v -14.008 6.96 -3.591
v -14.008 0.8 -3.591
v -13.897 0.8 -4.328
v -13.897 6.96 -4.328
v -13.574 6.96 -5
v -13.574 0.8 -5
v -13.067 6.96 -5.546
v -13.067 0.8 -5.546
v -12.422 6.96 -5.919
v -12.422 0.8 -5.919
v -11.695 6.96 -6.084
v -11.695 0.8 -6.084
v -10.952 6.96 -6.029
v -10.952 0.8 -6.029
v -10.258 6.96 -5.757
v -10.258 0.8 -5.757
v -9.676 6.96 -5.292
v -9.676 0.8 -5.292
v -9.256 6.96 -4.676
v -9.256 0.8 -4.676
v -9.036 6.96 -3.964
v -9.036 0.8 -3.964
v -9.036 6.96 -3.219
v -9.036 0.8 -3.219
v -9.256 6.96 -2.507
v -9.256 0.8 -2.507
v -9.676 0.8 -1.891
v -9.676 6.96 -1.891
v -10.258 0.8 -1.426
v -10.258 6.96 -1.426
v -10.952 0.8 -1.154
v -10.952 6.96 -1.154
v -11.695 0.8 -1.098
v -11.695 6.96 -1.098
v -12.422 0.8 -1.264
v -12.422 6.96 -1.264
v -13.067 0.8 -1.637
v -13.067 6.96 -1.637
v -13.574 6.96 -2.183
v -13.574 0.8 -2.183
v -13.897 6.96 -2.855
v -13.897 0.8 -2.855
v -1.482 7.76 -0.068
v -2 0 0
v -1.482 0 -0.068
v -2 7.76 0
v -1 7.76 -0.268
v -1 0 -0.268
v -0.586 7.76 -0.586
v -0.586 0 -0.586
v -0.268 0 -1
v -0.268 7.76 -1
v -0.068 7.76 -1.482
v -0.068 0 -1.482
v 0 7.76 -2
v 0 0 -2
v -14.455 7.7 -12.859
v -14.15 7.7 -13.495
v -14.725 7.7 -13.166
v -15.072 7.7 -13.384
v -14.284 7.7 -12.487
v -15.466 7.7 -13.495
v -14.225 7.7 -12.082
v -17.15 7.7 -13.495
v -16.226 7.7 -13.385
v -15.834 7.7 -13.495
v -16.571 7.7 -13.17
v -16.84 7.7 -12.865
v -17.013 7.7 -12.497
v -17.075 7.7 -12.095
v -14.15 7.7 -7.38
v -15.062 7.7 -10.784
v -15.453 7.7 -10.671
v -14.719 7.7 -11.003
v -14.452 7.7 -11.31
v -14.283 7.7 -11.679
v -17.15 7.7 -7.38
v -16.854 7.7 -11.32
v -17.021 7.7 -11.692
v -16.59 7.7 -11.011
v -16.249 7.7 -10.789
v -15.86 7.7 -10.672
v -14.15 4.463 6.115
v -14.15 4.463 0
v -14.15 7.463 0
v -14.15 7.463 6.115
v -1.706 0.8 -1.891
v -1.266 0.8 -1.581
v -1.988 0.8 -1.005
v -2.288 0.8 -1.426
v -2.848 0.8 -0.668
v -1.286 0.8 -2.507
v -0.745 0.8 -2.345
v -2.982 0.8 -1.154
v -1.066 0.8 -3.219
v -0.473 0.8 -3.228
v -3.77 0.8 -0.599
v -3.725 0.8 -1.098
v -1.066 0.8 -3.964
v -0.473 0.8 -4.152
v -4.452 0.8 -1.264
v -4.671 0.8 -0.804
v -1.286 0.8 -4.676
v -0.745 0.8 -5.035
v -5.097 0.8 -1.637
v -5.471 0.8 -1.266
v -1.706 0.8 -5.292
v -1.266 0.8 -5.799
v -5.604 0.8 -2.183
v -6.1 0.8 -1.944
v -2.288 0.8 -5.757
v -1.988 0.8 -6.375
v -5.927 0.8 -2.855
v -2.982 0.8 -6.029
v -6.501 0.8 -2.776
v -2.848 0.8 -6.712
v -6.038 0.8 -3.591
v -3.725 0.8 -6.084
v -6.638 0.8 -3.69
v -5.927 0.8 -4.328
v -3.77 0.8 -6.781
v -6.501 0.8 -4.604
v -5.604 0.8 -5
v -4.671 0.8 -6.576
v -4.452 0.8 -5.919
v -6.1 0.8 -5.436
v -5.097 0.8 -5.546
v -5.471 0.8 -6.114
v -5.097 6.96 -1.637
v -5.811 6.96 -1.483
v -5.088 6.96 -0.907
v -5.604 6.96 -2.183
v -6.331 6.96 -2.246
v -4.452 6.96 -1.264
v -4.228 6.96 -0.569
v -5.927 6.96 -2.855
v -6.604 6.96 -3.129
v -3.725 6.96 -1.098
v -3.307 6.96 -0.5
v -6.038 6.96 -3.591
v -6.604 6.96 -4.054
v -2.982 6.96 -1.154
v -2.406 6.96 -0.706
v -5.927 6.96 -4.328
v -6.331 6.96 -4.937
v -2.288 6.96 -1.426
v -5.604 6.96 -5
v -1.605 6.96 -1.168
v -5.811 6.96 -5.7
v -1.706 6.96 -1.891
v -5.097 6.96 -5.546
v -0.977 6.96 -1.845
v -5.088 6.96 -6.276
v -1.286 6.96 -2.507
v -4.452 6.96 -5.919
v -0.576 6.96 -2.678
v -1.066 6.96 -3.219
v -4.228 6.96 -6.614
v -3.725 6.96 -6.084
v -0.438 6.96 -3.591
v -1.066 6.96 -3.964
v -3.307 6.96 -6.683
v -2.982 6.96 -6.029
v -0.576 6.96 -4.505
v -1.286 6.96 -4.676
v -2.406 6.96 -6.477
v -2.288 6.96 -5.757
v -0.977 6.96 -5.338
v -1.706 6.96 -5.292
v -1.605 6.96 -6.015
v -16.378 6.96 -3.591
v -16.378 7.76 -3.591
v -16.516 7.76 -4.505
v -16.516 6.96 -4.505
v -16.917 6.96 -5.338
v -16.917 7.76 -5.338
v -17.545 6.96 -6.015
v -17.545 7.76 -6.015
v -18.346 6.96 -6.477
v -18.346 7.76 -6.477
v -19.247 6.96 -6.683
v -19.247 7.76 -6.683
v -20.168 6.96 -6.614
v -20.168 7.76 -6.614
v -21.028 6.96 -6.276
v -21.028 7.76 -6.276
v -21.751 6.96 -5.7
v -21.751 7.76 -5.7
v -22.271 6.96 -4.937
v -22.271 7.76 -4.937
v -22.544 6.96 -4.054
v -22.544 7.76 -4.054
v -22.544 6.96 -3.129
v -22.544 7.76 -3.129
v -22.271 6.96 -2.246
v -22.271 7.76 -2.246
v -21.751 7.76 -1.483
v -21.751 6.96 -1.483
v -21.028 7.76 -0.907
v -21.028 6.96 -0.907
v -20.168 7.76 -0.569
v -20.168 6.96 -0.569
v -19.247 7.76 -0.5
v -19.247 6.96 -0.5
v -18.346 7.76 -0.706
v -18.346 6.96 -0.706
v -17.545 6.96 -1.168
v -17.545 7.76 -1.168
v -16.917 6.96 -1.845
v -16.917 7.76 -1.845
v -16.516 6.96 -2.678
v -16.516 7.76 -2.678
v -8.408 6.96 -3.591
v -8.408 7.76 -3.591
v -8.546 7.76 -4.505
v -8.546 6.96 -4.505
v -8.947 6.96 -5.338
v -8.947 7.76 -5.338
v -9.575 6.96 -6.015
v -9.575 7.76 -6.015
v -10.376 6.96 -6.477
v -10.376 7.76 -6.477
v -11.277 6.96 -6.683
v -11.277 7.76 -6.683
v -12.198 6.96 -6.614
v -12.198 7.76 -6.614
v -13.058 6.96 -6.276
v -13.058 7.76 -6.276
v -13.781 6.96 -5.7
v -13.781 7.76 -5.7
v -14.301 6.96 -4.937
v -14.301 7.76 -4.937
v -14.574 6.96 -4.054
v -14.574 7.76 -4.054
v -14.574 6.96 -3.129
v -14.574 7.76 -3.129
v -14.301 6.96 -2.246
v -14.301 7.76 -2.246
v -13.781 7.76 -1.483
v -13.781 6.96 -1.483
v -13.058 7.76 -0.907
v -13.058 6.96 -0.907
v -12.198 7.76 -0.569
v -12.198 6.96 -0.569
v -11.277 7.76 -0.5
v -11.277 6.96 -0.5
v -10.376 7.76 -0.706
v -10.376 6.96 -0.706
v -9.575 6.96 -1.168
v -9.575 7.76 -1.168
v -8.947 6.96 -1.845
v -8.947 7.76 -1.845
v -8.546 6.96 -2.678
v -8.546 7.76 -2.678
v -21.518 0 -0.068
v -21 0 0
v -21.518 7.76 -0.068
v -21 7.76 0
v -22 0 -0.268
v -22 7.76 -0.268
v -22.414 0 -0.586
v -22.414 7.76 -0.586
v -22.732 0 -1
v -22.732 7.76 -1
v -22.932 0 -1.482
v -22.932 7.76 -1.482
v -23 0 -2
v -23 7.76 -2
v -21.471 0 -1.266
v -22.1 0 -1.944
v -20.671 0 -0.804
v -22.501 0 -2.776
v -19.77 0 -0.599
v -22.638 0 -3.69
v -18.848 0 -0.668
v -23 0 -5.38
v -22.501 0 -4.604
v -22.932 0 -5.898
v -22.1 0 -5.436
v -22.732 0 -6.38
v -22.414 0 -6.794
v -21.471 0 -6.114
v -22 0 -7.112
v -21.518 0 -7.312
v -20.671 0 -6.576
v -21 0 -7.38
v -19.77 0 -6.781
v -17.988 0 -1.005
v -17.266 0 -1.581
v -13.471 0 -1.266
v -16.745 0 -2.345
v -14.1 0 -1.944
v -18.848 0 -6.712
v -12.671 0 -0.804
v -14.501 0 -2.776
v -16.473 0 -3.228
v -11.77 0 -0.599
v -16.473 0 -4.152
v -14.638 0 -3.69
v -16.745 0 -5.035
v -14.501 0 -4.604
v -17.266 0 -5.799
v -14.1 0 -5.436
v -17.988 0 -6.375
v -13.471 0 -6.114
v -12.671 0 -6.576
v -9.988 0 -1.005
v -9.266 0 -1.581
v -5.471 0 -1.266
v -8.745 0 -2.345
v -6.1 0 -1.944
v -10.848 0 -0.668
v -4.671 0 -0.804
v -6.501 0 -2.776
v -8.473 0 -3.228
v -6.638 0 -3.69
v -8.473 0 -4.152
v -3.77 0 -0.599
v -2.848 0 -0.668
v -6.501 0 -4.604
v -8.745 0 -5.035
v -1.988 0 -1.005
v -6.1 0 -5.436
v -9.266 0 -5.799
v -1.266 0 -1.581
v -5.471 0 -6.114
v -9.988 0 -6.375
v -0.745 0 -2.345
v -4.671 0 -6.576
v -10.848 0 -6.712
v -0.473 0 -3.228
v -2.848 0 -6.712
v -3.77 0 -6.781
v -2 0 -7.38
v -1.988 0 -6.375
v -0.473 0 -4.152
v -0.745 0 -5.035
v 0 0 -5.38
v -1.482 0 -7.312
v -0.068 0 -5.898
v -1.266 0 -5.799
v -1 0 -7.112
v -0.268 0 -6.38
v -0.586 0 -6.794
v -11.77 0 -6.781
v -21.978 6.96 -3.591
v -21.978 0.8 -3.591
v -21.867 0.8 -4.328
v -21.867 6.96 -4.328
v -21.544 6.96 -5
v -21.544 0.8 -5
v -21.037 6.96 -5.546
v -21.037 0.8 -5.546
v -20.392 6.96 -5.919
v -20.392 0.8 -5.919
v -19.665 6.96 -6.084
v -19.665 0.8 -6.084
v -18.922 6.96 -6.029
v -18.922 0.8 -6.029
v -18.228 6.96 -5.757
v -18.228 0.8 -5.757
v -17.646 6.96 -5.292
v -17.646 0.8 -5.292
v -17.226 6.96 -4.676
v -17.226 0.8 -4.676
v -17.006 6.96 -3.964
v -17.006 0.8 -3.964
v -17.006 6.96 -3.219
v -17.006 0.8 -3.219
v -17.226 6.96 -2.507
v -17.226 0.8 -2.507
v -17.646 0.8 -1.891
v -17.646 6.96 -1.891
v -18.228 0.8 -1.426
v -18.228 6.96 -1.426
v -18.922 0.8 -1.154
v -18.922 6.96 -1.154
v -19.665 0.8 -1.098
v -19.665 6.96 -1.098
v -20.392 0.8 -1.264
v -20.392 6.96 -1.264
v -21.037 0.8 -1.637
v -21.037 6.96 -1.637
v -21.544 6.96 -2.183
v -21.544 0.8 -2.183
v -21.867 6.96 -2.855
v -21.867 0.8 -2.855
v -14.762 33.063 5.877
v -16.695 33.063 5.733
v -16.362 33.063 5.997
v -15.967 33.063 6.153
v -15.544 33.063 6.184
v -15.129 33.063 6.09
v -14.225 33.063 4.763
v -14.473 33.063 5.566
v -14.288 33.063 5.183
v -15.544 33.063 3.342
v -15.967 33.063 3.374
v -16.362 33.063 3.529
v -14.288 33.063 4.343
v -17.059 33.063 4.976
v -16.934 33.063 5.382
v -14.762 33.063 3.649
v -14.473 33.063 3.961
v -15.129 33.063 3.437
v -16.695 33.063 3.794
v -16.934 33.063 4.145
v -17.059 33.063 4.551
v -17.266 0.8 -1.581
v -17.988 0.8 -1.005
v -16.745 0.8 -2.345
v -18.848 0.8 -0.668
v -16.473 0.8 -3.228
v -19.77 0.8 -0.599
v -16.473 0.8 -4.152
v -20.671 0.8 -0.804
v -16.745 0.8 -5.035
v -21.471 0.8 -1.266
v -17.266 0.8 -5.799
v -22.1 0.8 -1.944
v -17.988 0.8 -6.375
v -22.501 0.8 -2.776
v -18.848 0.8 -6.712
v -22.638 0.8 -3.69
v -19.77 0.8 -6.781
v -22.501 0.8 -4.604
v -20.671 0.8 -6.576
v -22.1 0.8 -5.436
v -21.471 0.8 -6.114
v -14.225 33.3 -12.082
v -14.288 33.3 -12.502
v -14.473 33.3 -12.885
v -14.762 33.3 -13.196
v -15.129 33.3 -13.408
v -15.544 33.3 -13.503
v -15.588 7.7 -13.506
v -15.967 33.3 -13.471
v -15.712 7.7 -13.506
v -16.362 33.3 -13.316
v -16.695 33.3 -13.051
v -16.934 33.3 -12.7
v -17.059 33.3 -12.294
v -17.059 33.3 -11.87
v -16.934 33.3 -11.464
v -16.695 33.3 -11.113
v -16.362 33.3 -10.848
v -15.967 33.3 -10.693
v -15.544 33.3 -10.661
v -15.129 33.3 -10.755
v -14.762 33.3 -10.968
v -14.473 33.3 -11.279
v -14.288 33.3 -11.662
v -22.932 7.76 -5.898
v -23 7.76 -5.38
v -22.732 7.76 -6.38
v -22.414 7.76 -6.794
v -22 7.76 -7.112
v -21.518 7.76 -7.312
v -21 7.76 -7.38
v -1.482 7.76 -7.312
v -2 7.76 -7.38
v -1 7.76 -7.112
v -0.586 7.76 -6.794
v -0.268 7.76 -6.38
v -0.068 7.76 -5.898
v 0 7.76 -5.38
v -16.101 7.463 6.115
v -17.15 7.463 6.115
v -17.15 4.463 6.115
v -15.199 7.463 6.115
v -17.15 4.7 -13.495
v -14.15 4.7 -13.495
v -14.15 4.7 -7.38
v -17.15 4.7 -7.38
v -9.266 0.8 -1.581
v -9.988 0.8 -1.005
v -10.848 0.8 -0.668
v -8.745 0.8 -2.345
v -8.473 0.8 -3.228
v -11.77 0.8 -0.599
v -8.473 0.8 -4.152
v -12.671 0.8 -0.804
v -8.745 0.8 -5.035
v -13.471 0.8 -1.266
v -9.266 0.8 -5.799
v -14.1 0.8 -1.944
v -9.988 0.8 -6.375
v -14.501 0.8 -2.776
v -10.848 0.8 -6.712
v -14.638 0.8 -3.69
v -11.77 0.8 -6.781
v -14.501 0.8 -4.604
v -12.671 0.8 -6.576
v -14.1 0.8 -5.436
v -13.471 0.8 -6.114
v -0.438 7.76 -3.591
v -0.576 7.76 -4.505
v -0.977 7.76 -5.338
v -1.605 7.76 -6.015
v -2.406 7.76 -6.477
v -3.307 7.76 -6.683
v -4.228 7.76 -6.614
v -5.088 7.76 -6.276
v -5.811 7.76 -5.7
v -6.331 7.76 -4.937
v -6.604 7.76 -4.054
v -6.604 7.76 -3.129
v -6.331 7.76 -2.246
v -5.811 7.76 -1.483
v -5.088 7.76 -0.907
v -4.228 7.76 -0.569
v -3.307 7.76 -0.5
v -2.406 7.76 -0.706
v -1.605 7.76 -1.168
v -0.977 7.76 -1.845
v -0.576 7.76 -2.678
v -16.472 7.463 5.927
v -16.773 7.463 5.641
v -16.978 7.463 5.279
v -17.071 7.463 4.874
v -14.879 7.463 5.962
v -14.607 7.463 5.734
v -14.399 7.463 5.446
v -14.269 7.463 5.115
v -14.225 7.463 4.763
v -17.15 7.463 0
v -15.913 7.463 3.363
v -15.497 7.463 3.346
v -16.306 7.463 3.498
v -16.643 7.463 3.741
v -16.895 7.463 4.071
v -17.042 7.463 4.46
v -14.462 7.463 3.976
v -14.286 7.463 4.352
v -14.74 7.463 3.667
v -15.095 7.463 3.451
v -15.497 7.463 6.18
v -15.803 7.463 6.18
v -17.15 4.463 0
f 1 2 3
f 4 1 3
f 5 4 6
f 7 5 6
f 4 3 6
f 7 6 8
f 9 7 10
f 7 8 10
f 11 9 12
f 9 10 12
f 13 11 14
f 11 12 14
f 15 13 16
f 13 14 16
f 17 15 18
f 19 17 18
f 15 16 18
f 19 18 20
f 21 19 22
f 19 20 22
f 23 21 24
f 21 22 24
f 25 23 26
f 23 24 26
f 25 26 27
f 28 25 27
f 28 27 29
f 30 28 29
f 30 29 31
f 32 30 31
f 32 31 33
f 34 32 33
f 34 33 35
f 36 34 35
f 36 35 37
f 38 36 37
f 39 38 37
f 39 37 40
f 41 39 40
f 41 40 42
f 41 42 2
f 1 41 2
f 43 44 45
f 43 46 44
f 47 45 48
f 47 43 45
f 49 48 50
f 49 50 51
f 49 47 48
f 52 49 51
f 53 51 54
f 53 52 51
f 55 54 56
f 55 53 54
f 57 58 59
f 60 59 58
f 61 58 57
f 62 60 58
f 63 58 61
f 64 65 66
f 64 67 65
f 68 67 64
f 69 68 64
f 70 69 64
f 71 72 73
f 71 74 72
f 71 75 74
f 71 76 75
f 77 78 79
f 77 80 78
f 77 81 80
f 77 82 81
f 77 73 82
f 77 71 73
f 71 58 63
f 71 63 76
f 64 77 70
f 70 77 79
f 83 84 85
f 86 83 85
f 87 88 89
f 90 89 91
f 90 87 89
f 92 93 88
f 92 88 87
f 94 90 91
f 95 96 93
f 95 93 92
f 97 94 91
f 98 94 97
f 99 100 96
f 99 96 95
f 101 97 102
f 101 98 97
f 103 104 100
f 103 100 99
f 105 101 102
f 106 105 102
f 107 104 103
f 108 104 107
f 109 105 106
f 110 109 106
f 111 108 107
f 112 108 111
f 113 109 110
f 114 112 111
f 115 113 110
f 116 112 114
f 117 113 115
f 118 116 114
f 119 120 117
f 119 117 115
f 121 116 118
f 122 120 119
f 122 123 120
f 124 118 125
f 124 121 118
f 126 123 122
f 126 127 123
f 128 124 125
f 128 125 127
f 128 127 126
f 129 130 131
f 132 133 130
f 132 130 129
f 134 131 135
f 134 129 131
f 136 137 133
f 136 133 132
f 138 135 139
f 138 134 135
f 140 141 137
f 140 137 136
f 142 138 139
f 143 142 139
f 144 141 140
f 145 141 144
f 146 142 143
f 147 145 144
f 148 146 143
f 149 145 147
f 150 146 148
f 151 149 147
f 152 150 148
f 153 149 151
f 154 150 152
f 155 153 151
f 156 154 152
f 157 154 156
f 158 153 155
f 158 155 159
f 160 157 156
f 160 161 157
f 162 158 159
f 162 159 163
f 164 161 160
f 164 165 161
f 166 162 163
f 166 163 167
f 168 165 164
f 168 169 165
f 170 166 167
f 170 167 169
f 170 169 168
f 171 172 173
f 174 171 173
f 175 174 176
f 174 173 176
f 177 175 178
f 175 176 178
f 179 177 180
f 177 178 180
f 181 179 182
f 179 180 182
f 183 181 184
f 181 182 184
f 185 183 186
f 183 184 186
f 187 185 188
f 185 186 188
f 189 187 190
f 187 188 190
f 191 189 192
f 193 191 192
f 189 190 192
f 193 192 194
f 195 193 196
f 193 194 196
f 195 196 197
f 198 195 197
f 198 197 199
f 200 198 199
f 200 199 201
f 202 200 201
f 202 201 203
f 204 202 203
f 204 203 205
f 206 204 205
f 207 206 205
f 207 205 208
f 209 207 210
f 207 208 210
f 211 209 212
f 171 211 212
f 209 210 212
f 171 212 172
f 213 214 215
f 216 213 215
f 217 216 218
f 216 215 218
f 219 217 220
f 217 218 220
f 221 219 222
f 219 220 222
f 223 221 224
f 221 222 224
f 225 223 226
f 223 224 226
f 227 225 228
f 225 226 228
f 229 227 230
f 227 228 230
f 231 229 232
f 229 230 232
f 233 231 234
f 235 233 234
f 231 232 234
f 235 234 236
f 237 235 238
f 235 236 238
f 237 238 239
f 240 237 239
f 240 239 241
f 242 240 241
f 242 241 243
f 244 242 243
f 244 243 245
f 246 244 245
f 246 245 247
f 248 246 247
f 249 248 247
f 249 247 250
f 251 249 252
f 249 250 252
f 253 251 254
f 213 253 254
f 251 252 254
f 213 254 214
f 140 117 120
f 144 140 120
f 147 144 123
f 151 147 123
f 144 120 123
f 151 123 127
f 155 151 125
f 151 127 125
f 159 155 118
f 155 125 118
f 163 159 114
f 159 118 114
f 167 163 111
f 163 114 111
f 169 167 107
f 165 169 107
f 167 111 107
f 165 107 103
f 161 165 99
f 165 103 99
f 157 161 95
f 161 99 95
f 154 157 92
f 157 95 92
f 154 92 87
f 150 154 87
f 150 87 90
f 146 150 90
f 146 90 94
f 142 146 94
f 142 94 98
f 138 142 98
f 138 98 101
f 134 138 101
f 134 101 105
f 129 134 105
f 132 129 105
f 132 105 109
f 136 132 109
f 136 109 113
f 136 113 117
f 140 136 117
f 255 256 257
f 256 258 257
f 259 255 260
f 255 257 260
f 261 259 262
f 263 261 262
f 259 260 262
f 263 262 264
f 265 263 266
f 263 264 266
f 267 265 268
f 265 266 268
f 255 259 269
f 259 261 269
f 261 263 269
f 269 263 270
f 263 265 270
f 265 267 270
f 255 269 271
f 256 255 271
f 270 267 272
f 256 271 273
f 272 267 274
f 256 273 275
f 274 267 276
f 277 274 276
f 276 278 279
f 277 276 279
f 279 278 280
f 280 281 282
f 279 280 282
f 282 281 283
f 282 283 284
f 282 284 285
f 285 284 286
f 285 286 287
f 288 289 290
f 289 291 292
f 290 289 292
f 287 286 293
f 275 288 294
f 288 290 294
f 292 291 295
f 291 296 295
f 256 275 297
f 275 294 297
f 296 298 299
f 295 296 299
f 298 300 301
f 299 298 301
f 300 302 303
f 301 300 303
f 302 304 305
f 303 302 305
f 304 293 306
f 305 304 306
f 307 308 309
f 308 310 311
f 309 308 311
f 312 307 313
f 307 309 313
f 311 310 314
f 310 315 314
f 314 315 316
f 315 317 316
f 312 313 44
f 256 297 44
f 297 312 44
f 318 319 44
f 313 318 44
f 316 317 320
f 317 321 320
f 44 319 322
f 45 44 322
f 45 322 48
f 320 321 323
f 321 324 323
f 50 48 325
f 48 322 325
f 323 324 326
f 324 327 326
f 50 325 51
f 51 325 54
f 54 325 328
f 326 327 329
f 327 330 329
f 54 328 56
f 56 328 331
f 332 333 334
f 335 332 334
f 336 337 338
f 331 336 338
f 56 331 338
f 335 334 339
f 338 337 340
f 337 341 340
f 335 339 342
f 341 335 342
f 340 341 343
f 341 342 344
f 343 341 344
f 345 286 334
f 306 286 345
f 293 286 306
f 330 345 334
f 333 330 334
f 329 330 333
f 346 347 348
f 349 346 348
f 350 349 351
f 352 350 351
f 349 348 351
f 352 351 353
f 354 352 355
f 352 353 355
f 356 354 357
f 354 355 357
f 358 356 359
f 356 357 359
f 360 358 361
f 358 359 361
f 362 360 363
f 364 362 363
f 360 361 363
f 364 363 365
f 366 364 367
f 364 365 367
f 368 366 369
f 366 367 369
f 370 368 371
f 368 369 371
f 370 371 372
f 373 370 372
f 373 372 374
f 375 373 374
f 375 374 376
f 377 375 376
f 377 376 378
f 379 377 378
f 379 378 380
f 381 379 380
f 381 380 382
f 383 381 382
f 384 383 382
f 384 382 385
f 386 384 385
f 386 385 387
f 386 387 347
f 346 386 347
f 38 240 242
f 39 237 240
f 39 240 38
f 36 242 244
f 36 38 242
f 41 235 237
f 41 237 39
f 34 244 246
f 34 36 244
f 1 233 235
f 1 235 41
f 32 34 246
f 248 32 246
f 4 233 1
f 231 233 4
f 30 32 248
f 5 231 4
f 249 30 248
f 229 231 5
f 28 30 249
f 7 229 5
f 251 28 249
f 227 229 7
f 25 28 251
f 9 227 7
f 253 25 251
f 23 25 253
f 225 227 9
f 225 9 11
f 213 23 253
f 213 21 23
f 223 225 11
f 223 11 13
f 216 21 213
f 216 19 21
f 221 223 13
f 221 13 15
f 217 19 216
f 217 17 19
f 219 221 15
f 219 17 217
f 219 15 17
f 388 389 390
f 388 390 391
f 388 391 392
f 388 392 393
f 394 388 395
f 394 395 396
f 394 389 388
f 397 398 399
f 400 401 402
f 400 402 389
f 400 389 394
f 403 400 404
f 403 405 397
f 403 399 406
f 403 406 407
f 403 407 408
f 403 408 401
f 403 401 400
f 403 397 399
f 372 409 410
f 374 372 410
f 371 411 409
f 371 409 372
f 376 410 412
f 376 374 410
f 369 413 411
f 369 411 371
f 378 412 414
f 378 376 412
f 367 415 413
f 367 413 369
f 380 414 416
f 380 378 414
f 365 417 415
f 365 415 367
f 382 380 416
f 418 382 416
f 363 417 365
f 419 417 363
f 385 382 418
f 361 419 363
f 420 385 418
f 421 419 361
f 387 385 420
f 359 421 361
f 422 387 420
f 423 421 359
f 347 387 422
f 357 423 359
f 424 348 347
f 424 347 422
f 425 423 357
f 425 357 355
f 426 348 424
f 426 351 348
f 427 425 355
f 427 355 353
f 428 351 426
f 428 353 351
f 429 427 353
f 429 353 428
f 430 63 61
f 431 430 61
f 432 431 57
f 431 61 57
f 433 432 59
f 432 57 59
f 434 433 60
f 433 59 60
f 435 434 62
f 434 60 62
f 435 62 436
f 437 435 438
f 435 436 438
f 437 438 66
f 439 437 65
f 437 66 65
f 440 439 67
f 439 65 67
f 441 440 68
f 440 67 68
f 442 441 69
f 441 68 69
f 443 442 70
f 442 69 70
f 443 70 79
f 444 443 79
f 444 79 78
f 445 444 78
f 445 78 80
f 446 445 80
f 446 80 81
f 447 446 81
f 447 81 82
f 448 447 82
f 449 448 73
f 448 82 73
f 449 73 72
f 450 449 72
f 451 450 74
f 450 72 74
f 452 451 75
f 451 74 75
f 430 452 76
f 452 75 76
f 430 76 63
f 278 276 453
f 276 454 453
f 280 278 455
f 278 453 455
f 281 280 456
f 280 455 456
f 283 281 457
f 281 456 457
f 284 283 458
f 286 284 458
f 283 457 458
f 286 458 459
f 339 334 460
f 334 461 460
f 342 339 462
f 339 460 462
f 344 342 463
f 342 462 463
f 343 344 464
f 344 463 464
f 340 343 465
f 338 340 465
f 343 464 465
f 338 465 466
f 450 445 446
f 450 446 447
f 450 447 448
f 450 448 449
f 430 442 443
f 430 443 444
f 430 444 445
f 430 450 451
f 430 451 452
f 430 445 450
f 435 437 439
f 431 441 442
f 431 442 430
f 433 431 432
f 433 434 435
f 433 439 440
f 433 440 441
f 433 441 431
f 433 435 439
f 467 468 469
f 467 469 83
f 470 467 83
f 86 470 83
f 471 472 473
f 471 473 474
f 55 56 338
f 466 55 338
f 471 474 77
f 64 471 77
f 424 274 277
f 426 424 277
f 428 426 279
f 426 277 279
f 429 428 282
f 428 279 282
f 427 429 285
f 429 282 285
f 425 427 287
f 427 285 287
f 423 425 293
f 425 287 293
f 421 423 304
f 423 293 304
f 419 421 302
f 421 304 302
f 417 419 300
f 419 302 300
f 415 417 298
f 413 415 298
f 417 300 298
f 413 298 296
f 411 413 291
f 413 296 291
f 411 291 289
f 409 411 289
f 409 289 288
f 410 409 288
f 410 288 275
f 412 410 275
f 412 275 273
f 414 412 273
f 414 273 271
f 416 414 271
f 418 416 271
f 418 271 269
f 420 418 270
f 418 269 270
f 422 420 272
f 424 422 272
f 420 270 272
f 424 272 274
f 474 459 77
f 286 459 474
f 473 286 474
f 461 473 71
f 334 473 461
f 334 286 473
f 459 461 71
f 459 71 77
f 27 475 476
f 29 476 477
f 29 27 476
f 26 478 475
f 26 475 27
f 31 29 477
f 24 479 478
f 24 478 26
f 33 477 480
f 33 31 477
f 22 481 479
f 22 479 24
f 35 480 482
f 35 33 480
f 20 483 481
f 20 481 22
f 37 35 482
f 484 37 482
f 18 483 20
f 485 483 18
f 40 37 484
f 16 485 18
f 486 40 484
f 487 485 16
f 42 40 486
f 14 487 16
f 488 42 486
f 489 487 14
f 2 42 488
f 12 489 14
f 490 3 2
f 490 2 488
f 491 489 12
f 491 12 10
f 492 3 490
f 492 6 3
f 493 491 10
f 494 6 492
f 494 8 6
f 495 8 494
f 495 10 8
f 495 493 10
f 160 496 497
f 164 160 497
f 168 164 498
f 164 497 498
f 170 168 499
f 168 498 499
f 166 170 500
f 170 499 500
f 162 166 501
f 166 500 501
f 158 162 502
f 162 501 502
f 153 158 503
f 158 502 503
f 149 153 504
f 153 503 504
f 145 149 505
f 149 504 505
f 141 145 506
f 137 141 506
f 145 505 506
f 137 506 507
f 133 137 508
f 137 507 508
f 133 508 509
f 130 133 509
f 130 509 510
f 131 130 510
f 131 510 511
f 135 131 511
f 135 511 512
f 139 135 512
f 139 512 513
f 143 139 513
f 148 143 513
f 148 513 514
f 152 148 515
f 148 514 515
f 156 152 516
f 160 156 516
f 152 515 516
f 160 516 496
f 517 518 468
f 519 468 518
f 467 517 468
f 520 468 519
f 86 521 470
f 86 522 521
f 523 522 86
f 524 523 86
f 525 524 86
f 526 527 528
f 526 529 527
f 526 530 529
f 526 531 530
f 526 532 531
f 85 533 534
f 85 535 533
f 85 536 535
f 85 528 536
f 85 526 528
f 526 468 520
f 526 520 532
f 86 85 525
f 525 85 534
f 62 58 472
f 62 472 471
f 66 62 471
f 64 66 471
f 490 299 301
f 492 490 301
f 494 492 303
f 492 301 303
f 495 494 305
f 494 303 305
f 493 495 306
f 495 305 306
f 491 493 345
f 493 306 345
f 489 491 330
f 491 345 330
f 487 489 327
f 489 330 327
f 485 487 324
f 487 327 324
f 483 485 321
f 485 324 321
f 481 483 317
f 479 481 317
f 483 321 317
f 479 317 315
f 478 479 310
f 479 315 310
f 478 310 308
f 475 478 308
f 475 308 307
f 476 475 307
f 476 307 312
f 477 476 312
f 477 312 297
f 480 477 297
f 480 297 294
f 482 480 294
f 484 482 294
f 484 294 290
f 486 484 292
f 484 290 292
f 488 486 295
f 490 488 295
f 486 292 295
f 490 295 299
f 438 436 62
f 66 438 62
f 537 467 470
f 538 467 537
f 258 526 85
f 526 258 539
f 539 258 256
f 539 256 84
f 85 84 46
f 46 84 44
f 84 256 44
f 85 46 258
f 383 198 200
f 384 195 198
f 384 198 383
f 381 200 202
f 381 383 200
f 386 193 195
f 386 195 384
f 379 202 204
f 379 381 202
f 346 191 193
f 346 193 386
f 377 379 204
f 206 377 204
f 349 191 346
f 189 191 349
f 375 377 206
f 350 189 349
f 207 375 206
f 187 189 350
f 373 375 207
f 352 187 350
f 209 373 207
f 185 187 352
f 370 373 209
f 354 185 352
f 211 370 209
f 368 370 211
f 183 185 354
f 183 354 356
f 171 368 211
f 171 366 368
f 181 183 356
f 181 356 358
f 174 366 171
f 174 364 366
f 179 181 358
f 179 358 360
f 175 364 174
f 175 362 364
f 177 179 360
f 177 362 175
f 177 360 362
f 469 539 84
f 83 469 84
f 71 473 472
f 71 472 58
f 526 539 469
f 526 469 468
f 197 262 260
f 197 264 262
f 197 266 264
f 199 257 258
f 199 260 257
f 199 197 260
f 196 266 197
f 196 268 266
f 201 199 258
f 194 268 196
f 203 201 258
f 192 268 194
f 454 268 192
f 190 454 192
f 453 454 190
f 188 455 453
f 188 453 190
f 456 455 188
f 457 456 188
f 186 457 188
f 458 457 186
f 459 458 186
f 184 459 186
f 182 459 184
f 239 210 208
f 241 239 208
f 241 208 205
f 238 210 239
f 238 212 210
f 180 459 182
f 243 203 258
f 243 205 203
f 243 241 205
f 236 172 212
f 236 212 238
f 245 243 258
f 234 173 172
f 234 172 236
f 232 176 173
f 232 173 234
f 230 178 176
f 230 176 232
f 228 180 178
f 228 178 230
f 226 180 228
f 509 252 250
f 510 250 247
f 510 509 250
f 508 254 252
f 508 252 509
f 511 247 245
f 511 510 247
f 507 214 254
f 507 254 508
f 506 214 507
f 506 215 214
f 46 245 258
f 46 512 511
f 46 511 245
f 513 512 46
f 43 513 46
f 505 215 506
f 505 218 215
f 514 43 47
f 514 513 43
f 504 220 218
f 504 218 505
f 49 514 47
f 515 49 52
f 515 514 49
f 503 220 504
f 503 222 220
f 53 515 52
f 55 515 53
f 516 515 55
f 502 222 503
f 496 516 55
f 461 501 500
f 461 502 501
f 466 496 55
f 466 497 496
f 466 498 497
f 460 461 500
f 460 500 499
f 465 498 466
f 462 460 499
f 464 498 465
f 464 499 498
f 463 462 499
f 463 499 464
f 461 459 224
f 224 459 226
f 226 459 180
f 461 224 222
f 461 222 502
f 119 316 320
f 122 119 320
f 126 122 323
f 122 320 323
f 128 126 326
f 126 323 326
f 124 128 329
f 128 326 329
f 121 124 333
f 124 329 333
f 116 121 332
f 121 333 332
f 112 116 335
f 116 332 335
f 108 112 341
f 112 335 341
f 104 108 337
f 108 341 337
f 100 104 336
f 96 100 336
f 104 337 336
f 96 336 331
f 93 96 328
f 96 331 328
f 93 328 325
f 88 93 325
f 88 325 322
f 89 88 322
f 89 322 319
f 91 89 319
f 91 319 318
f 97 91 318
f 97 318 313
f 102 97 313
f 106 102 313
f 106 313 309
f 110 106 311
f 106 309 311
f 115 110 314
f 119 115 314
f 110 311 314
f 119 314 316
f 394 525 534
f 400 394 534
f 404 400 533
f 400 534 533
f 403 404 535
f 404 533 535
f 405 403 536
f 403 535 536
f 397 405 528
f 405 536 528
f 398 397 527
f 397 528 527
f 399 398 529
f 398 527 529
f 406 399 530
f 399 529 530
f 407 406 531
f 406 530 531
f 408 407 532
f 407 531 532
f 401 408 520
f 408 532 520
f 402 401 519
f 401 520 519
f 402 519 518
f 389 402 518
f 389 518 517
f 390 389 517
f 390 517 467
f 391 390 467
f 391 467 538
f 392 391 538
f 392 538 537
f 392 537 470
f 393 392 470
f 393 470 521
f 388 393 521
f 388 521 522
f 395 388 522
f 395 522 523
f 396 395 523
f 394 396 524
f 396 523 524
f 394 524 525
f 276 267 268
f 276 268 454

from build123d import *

# Parameters (mm, degrees)
SKETCH3_W           = 23
SKETCH3_H           = 7.38
BOSS_EXTRUDE1_DEPTH = 7.76
SKETCH4_R           = 3.1
CUT_EXTRUDE2_DEPTH  = 0.8
SKETCH7_R           = 3.1
CUT_EXTRUDE3_DEPTH  = 0.8
SKETCH6_R           = 2.5
CUT_EXTRUDE4_DEPTH  = 7.96
FILLET3_R           = 2
FILLET4_R           = 2
FILLET5_R           = 2
FILLET6_R           = 2
SKETCH8_W           = 3
SKETCH8_H           = 3
BOSS_EXTRUDE2_DEPTH = 6.115
SKETCH9_R           = 1.425
BOSS_EXTRUDE3_DEPTH = 25.6
SKETCH12_W          = 3
SKETCH12_H          = 3
BOSS_EXTRUDE4_DEPTH = 6.115
SKETCH13_R          = 1.425
BOSS_EXTRUDE5_DEPTH = 25.6


with BuildPart() as part:
    # Sketch3 → Boss-Extrude1 (new body)
    with BuildSketch(Plane(origin=(0, 0, 0), x_dir=(1, 0, 0), z_dir=(0, 1, 0))):
        with Locations((-11.5, 3.69)):
            Rectangle(SKETCH3_W, SKETCH3_H)
    extrude(amount=BOSS_EXTRUDE1_DEPTH)

    # Sketch4 → Cut-Extrude2 (cut)
    with BuildSketch(Plane(origin=(0, 0, 0), x_dir=(-1, 0, 0), z_dir=(0, -1, 0))):
        with Locations((19.538269405, 3.69)):
            Circle(SKETCH4_R)
        with Locations((11.538269405, 3.69)):
            Circle(SKETCH4_R)
        with Locations((3.538269405, 3.69)):
            Circle(SKETCH4_R)
    extrude(amount=-CUT_EXTRUDE2_DEPTH, mode=Mode.SUBTRACT)

    # Sketch7 → Cut-Extrude3 (cut)
    with BuildSketch(Plane(origin=(0, 7.76, 0), x_dir=(1, 0, 0), z_dir=(0, 1, 0))):
        with Locations((-19.478269405, 3.591470107)):
            Circle(SKETCH7_R)
        with Locations((-11.508269405, 3.591470107)):
            Circle(SKETCH7_R)
        with Locations((-3.538269405, 3.591470107)):
            Circle(SKETCH7_R)
    extrude(amount=-CUT_EXTRUDE3_DEPTH, mode=Mode.SUBTRACT)

    # Sketch6 → Cut-Extrude4 (cut, through all)
    with BuildSketch(Plane(origin=(0, 0.8, 0), x_dir=(-1, 0, 0), z_dir=(0, -1, 0))):
        with Locations((3.538269405, 3.591470107)):
            Circle(SKETCH6_R)
        with Locations((11.508269405, 3.591470107)):
            Circle(SKETCH6_R)
        with Locations((19.478269405, 3.591470107)):
            Circle(SKETCH6_R)
    extrude(amount=-CUT_EXTRUDE4_DEPTH, mode=Mode.SUBTRACT)

    # Fillet3
    fillet3_edges = [part.edges().sort_by_distance(p)[0] for p in [
        (0, 3.88, 0),
    ]]
    fillet(fillet3_edges, radius=FILLET3_R)

    # Fillet4
    fillet4_edges = [part.edges().sort_by_distance(p)[0] for p in [
        (-23, 3.88, 0),
    ]]
    fillet(fillet4_edges, radius=FILLET4_R)

    # Fillet5
    fillet5_edges = [part.edges().sort_by_distance(p)[0] for p in [
        (-23, 3.88, -7.38),
    ]]
    fillet(fillet5_edges, radius=FILLET5_R)

    # Fillet6
    fillet6_edges = [part.edges().sort_by_distance(p)[0] for p in [
        (0, 3.88, -7.38),
    ]]
    fillet(fillet6_edges, radius=FILLET6_R)

    # Sketch8 → Boss-Extrude2 (add)
    with BuildSketch(Plane(origin=(0, 0, -7.38), x_dir=(-1, 0, 0), z_dir=(0, 0, -1))):
        with Locations((15.65, 6.200251459)):
            Rectangle(SKETCH8_W, SKETCH8_H)
    extrude(amount=BOSS_EXTRUDE2_DEPTH)

    # Sketch9 → Boss-Extrude3 (add)
    with BuildSketch(Plane(origin=(0, 7.700251459, 0), x_dir=(1, 0, 0), z_dir=(0, 1, 0))):
        with Locations((-15.65, 12.081963091)):
            Circle(SKETCH9_R)
    extrude(amount=BOSS_EXTRUDE3_DEPTH)

    # Sketch12 → Boss-Extrude4 (add)
    with BuildSketch(Plane.XY):
        with Locations((-15.65, 5.962808026)):
            Rectangle(SKETCH12_W, SKETCH12_H)
    extrude(amount=BOSS_EXTRUDE4_DEPTH)

    # Sketch13 → Boss-Extrude5 (add)
    with BuildSketch(Plane(origin=(0, 7.462808026, 0), x_dir=(1, 0, 0), z_dir=(0, 1, 0))):
        with Locations((-15.65, -4.763284268)):
            Circle(SKETCH13_R)
    extrude(amount=BOSS_EXTRUDE5_DEPTH)


solid = part.part
